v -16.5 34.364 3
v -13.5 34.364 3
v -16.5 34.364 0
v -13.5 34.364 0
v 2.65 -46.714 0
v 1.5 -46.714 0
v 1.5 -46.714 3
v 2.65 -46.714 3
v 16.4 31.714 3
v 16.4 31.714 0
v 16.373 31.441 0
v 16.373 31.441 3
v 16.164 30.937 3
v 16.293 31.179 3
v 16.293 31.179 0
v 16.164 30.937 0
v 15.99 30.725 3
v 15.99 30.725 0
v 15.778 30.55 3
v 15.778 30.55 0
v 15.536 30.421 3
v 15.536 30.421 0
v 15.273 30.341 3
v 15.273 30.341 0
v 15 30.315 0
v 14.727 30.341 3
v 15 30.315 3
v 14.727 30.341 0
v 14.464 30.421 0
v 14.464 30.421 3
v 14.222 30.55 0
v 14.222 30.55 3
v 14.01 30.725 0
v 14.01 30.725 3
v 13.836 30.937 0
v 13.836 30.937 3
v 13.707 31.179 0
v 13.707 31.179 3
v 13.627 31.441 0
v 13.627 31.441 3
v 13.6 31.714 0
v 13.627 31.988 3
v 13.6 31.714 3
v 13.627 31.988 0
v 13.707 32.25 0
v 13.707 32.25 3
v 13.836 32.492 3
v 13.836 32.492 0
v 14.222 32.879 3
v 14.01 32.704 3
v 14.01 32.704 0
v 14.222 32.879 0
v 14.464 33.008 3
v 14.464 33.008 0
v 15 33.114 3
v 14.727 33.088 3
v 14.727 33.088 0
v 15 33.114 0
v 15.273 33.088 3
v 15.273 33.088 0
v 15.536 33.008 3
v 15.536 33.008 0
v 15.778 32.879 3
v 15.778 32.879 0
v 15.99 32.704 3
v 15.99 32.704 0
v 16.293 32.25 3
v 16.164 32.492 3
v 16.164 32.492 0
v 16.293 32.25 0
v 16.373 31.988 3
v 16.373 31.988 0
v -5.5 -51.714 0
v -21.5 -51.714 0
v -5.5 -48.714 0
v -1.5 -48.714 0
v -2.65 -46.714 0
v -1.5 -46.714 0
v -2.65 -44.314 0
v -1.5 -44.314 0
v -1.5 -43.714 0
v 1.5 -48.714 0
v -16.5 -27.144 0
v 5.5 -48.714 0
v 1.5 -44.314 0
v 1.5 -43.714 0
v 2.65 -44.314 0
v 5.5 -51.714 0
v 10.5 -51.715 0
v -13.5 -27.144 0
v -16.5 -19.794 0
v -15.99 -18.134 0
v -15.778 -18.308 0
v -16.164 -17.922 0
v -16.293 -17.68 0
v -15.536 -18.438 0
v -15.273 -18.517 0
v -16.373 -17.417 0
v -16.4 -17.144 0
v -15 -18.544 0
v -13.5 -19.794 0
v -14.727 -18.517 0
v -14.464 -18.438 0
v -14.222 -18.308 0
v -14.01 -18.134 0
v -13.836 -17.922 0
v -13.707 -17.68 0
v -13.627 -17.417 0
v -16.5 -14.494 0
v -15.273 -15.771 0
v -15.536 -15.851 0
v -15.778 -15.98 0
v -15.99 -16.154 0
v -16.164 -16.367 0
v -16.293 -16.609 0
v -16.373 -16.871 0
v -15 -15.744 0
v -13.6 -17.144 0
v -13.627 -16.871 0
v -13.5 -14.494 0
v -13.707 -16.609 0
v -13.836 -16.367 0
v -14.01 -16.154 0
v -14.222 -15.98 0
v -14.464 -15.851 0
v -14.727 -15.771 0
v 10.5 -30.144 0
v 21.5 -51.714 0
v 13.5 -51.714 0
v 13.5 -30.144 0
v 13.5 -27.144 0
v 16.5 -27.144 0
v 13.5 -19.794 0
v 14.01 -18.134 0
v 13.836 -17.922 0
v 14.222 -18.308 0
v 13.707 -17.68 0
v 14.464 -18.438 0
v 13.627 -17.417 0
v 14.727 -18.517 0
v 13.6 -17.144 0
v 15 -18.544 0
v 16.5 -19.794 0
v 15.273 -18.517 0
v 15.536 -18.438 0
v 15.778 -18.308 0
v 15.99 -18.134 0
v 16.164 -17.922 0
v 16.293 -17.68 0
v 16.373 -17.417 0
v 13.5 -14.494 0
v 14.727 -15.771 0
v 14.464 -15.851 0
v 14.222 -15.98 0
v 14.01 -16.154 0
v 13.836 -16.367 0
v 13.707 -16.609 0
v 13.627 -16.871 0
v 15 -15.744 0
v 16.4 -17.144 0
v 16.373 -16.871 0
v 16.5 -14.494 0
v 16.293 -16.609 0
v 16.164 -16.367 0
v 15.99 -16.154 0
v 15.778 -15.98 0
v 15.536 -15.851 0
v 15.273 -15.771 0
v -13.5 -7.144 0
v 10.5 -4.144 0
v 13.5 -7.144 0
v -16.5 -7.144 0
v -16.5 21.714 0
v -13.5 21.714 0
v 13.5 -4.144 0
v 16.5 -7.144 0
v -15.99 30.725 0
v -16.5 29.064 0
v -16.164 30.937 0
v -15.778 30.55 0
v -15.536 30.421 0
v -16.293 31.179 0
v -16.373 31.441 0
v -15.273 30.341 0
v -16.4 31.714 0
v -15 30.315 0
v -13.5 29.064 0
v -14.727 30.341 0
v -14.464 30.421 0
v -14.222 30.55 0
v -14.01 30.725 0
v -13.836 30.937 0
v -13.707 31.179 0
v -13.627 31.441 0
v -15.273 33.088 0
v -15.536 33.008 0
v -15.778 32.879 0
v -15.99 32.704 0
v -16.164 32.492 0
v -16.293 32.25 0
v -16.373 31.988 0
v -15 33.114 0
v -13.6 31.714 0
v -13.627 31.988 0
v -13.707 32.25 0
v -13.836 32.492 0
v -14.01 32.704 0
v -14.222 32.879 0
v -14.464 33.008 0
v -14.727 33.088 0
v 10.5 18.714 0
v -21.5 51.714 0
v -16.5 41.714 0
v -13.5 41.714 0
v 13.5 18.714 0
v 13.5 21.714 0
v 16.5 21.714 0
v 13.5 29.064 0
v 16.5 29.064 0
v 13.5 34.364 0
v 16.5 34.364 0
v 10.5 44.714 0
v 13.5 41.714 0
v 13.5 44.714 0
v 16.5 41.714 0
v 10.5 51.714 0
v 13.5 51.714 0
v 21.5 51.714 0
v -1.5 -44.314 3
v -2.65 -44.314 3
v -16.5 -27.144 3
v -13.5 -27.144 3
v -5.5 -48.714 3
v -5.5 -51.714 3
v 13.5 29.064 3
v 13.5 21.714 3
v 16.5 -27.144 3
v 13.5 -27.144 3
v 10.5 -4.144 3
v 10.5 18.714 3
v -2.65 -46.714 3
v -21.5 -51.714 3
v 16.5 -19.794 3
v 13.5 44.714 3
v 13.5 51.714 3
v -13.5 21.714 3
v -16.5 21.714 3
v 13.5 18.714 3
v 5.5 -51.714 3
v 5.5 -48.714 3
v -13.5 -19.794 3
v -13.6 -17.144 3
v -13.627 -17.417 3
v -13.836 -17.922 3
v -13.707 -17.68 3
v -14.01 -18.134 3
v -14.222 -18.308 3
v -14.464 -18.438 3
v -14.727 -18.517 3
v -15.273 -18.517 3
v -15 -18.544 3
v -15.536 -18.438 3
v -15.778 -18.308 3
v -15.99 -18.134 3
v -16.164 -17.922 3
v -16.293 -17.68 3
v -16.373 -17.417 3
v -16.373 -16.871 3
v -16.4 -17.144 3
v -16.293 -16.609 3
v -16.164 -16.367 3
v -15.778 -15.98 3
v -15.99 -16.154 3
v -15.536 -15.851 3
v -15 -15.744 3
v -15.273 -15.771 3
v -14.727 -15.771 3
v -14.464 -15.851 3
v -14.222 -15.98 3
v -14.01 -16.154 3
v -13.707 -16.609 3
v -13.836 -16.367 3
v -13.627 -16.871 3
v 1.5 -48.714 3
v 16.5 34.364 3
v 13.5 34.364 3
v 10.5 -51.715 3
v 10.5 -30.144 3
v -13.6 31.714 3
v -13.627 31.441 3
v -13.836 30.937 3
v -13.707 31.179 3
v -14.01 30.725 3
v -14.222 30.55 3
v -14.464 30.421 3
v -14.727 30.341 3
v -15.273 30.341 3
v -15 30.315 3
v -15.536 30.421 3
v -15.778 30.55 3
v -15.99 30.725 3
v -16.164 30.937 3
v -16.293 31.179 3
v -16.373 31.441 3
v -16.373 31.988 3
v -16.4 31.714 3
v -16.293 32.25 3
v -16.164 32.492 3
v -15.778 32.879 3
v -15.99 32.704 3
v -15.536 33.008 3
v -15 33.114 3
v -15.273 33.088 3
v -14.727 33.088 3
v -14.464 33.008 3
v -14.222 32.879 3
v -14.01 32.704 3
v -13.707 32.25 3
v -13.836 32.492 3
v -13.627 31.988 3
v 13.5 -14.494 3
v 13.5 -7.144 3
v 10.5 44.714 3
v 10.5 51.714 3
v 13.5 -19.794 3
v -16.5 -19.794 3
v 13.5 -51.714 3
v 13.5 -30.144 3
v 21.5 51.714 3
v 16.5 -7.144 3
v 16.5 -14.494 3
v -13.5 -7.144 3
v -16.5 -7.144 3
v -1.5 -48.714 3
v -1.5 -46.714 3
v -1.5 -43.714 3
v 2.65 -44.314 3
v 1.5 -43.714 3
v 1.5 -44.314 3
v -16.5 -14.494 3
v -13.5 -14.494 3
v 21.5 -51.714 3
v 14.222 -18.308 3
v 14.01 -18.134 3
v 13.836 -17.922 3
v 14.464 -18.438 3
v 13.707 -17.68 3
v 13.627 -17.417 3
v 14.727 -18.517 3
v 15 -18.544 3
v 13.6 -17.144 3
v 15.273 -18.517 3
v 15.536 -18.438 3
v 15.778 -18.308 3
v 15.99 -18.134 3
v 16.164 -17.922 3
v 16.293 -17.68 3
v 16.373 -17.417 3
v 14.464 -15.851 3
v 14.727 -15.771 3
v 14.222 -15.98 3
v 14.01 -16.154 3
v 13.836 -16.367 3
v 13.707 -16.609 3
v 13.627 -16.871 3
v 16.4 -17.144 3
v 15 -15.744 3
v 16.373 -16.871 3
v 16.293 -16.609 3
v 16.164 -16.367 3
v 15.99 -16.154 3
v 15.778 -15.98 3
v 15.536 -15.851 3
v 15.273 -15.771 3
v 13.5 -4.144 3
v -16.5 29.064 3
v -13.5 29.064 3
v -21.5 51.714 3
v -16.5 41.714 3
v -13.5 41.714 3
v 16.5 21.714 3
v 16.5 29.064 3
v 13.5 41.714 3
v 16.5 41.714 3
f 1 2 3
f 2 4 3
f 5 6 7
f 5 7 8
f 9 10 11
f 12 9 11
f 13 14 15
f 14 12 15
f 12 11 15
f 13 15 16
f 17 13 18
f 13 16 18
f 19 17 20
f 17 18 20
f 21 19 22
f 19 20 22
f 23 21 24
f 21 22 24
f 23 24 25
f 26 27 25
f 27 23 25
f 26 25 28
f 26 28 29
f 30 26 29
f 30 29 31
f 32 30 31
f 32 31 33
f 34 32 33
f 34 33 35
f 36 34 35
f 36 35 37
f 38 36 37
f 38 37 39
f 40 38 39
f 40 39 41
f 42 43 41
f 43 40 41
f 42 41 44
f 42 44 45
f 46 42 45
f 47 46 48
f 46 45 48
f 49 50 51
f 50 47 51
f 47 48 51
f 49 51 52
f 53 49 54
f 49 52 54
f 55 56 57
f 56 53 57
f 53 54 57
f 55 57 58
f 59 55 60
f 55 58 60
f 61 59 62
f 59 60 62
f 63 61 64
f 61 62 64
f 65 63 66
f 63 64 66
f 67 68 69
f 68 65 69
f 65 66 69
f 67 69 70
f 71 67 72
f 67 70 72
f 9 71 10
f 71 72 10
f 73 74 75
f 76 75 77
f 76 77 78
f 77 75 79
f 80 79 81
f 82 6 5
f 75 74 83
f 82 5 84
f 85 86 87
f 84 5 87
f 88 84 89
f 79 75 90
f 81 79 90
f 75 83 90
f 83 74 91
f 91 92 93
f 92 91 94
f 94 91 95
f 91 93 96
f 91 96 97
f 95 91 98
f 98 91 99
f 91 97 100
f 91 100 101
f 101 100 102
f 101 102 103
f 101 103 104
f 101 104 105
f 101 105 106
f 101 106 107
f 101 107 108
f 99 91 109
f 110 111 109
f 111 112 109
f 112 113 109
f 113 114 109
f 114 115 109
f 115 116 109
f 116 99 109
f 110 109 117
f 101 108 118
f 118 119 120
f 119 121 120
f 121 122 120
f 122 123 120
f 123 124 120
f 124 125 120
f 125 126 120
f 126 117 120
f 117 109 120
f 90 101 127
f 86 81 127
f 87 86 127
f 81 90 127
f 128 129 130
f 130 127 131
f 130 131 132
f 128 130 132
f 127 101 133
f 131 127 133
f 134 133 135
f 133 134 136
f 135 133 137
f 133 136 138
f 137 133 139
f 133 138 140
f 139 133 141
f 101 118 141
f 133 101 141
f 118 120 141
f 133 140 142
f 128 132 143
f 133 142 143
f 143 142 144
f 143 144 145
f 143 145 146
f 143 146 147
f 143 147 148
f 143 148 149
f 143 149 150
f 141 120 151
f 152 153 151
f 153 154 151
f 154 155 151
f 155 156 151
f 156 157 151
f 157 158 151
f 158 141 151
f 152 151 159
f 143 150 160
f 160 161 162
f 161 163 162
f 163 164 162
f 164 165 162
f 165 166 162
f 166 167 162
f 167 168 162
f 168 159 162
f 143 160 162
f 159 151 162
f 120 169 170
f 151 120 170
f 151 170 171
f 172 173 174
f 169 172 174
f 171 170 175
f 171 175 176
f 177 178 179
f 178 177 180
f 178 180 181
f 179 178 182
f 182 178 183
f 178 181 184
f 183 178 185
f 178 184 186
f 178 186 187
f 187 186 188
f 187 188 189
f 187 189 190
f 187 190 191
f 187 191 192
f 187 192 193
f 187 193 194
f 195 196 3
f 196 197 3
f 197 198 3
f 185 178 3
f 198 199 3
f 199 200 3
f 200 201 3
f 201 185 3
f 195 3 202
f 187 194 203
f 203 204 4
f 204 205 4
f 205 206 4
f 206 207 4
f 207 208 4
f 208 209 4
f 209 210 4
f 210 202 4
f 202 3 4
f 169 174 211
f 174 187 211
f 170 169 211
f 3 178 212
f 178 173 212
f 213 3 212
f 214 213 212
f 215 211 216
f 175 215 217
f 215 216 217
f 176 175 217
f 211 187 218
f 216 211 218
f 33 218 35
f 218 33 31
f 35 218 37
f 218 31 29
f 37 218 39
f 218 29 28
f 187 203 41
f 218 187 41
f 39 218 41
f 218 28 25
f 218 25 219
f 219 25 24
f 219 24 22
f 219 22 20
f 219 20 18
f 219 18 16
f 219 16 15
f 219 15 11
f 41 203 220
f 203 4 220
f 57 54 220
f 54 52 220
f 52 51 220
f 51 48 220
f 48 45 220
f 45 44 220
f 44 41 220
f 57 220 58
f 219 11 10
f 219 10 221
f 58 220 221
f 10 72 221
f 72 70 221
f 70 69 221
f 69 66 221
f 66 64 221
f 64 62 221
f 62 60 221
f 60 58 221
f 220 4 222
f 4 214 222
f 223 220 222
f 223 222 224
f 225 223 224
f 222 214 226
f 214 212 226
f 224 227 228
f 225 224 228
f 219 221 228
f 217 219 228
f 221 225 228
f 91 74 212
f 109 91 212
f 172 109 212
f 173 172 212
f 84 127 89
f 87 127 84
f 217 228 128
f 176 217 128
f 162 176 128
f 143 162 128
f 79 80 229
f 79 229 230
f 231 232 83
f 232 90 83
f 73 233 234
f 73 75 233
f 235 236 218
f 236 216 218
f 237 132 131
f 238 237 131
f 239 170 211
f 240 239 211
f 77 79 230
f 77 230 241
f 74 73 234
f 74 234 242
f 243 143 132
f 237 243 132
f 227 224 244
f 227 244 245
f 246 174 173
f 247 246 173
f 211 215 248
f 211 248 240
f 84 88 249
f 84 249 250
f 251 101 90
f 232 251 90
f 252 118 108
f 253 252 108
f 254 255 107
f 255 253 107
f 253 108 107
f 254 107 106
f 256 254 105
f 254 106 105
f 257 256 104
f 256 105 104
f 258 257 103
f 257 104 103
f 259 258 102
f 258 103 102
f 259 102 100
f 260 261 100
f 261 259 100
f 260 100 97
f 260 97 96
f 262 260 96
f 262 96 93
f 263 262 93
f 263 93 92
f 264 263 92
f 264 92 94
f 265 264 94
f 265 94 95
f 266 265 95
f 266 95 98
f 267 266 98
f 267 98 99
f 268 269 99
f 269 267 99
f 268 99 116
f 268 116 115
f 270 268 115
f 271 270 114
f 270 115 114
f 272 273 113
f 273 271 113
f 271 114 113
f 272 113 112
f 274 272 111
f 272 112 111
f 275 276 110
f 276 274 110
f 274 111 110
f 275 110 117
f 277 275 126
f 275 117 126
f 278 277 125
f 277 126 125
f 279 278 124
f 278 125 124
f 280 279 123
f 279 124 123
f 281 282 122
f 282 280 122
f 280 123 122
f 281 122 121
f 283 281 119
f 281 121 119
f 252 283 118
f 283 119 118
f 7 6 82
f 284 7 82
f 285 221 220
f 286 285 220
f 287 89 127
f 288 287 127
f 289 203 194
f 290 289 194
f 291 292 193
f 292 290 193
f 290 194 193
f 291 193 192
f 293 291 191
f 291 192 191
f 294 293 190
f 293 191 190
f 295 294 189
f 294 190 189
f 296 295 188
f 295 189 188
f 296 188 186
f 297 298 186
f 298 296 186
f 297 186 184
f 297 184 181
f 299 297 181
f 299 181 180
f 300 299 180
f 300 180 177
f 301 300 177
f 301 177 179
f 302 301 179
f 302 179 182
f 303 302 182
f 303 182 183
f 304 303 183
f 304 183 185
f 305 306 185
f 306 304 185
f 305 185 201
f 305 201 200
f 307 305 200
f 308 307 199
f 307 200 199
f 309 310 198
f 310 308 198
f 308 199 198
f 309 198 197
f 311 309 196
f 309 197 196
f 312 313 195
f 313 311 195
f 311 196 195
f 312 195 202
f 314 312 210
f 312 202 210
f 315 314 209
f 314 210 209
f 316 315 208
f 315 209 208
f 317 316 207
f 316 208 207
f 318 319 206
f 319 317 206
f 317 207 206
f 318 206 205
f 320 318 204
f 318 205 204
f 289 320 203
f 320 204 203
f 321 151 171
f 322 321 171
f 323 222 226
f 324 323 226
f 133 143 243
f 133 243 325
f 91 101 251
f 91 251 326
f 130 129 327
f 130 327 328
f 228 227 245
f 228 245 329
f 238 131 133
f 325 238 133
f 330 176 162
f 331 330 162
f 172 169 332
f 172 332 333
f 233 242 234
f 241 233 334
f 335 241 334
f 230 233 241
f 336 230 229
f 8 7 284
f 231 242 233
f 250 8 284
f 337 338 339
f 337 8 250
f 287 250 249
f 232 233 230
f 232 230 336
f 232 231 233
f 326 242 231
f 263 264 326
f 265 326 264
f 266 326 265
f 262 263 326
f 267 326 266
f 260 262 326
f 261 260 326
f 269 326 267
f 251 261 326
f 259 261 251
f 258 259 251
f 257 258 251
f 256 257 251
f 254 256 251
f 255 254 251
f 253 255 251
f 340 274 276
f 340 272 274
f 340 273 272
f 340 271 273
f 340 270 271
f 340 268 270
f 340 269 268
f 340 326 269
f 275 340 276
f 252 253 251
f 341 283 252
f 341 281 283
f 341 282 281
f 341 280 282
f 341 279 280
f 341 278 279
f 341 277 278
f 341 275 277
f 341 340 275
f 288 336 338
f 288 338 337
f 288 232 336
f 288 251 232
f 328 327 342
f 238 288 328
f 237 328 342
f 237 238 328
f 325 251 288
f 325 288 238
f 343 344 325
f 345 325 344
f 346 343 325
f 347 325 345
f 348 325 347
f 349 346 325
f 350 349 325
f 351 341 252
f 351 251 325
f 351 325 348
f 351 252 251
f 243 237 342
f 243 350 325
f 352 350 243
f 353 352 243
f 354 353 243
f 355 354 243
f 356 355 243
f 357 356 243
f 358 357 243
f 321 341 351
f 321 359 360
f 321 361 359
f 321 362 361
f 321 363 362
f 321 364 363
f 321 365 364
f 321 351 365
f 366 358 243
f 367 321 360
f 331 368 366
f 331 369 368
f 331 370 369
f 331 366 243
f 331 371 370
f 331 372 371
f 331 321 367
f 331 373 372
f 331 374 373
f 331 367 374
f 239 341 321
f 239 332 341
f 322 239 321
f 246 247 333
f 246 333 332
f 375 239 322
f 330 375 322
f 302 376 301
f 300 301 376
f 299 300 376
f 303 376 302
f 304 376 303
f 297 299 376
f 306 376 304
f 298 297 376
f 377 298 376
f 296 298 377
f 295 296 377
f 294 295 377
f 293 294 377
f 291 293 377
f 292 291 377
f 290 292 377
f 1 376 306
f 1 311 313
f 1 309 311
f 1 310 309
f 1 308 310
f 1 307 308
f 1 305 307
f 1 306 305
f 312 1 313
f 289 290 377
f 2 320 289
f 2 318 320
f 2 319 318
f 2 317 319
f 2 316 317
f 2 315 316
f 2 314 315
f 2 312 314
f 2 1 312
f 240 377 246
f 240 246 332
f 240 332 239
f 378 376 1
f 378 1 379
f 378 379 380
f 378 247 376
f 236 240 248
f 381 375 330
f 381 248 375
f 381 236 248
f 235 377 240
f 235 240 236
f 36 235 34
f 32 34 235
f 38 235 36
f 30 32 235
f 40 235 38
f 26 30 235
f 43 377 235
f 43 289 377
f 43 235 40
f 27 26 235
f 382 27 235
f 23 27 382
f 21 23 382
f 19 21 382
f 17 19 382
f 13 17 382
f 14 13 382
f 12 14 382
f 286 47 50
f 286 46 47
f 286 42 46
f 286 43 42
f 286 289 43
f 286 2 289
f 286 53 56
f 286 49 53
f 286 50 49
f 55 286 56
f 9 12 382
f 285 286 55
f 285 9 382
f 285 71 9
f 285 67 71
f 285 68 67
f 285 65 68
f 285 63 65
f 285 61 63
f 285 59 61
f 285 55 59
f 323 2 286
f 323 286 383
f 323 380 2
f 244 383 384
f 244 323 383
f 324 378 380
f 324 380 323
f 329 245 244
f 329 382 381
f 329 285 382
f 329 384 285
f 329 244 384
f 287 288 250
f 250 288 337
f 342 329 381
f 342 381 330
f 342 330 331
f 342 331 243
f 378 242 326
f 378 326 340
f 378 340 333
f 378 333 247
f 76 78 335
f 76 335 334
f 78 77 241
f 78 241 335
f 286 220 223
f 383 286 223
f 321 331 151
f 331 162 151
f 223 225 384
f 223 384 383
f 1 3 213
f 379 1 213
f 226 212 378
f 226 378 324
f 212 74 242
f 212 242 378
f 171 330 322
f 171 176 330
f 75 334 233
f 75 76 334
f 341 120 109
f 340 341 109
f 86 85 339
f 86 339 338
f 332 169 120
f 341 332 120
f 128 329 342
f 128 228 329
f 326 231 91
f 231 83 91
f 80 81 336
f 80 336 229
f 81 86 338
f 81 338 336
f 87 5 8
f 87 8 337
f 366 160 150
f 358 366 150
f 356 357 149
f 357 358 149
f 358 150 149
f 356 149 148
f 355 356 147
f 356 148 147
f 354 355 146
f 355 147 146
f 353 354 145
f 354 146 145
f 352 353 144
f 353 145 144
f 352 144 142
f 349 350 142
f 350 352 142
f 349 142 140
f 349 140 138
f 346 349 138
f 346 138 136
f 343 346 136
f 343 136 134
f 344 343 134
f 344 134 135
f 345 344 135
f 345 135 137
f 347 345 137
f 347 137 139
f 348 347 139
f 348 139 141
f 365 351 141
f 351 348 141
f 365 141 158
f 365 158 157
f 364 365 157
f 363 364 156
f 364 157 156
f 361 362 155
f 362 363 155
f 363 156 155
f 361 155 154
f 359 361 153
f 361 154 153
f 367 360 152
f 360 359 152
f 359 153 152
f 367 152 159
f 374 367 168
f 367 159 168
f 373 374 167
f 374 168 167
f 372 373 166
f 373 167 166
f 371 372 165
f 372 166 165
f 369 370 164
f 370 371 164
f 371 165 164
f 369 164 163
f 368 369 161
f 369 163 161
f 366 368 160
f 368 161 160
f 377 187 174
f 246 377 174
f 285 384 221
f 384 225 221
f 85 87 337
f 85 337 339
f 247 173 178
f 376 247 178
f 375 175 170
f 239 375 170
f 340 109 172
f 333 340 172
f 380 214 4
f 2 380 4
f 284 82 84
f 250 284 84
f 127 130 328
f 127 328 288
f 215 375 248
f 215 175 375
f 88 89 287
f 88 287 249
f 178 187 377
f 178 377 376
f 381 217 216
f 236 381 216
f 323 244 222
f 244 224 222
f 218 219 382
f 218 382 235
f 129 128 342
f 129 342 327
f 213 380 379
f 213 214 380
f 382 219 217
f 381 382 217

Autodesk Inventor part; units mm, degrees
ref_plane "YZ Plane" through (0, 0, 0) normal (1, 0, 0) x (0, 1, 0)
ref_plane "XZ Plane" through (0, 0, 0) normal (0, 1, 0) x (-1, 0, 0)
ref_plane "XY Plane" through (0, 0, 0) normal (0, 0, 1) x (1, 0, 0)
sketch "Sketch1" plane through (0, 0, 0) normal (0, 0, 1) x (1, 0, 0)
  line L0 (-21.5, 51.7145) -> (21.5, 51.7145)
  line L1 (21.5, 51.7145) -> (21.5, -51.7145)
  line L2 (-21.5, -51.7145) -> (-21.5, 51.7145)
  line L3 (5.5, -51.7145) -> (5.5, -48.7145)
  line L4 (1.5, -46.7145) -> (2.65, -46.7145)
  line L5 (2.65, -46.7145) -> (2.65, -44.3145)
  line L6 (2.65, -44.3145) -> (1.5, -44.3145)
  line L7 (1.5, -44.3145) -> (1.5, -43.7145)
  line L8 (1.5, -43.7145) -> (-1.5, -43.7145)
  line L9 (-1.5, -43.7145) -> (-1.5, -44.3145)
  line L10 (-1.5, -44.3145) -> (-2.65, -44.3145)
  line L11 (-2.65, -44.3145) -> (-2.65, -46.7145)
  line L12 (-2.65, -46.7145) -> (-1.5, -46.7145)
  line L13 (-5.5, -48.7145) -> (-5.5, -51.7145)
  line L14 (1.5, -46.7145) -> (1.5, -48.7145)
  line L15 (1.5, -48.7145) -> (5.5, -48.7145)
  line L16 (-1.5, -46.7145) -> (-1.5, -48.7145)
  line L17 (-1.5, -48.7145) -> (-5.5, -48.7145)
  line L18 (21.5, -51.7145) -> (13.5, -51.7145)
  line L19 (-5.5, -51.7145) -> (-21.5, -51.7145)
  line L20 (-30.1, 0) -> (30.1, 0) construction
  line L21 (0, -72.4008) -> (0, 72.4004) construction
  line L22 (13.5, 44.7145) -> (13.5, 51.7145) projected
  line L23 (13.5, 51.7145) -> (10.5, 51.7145) projected
  line L24 (10.5, 44.7145) -> (10.5, 51.7145) projected
  line L25 (13.5, 44.7145) -> (10.5, 44.7145) projected
  line L26 (13.5, -4.1443) -> (13.5, 18.7145) projected
  line L27 (13.5, 18.7145) -> (10.5, 18.7145) projected
  line L28 (10.5, -4.1443) -> (10.5, 18.7145) projected
  line L29 (13.5, -4.1443) -> (10.5, -4.1443) projected
  line L30 (13.5, -51.7149) -> (13.5, -30.1443) projected
  line L31 (13.5, -30.1443) -> (10.5, -30.1443) projected
  line L32 (10.5, -51.7149) -> (10.5, -30.1443) projected
  line L33 (13.5, -51.7149) -> (10.5, -51.7149) projected
  line L34 (16.5, 41.7145) -> (16.5, 34.3645) projected
  line L35 (16.5, 41.7145) -> (13.5, 41.7145) projected
  line L36 (13.5, 34.3645) -> (13.5, 41.7145) projected
  line L37 (16.5, 34.3645) -> (13.5, 34.3645) projected
  line L38 (16.5, 29.0645) -> (16.5, 21.7145) projected
  line L39 (16.5, 29.0645) -> (13.5, 29.0645) projected
  line L40 (13.5, 21.7145) -> (13.5, 29.0645) projected
  line L41 (16.5, 21.7145) -> (13.5, 21.7145) projected
  line L42 (16.5, -7.1443) -> (16.5, -14.4943) projected
  line L43 (16.5, -7.1443) -> (13.5, -7.1443) projected
  line L44 (13.5, -14.4943) -> (13.5, -7.1443) projected
  line L45 (16.5, -14.4943) -> (13.5, -14.4943) projected
  line L46 (16.5, -19.7943) -> (16.5, -27.1443) projected
  line L47 (16.5, -19.7943) -> (13.5, -19.7943) projected
  line L48 (13.5, -27.1443) -> (13.5, -19.7943) projected
  line L49 (16.5, -27.1443) -> (13.5, -27.1443) projected
  line L50 (-13.5, -19.7943) -> (-13.5, -27.1443) projected
  line L51 (-13.5, -19.7943) -> (-16.5, -19.7943) projected
  line L52 (-16.5, -27.1443) -> (-16.5, -19.7943) projected
  line L53 (-13.5, -27.1443) -> (-16.5, -27.1443) projected
  line L54 (-13.5, -7.1443) -> (-13.5, -14.4943) projected
  line L55 (-13.5, -7.1443) -> (-16.5, -7.1443) projected
  line L56 (-16.5, -14.4943) -> (-16.5, -7.1443) projected
  line L57 (-13.5, -14.4943) -> (-16.5, -14.4943) projected
  line L58 (-13.5, 29.0645) -> (-13.5, 21.7145) projected
  line L59 (-13.5, 29.0645) -> (-16.5, 29.0645) projected
  line L60 (-16.5, 21.7145) -> (-16.5, 29.0645) projected
  line L61 (-13.5, 21.7145) -> (-16.5, 21.7145) projected
  line L62 (-13.5, 41.7145) -> (-13.5, 34.3645) projected
  line L63 (-13.5, 41.7145) -> (-16.5, 41.7145) projected
  line L64 (-16.5, 34.3645) -> (-16.5, 41.7145) projected
  line L65 (-13.5, 34.3645) -> (-16.5, 34.3645) projected
  line L66 (16.5, 34.3645) -> (13.5, 29.0645) construction
  line L67 (13.5, 34.3645) -> (16.5, 29.0645) construction
  line L68 (13.5, -14.4943) -> (16.5, -19.7943) construction
  line L69 (16.5, -14.4943) -> (13.5, -19.7943) construction
  line L70 (-13.5, -14.4943) -> (-16.5, -19.7943) construction
  line L71 (-16.5, -14.4943) -> (-13.5, -19.7943) construction
  line L72 (-13.5, 34.3645) -> (-16.5, 29.0645) construction
  line L73 (-16.5, 34.3645) -> (-13.5, 29.0645) construction
  circle A0 centre (-15, 31.7145) radius 1.4
  circle A1 centre (15, 31.7145) radius 1.4
  circle A2 centre (15, -17.1443) radius 1.4
  circle A3 centre (-15, -17.1443) radius 1.4
  line L74 (13.5, -51.7145) -> (10.5, -51.7145)
  line L75 (10.5, -51.7145) -> (5.5, -51.7145)
  dimension "d0" = 43
  dimension "d12" = 3
  dimension "d13" = 5.3
  dimension "d15" = 2.4
  dimension "d19" = 3
  dimension "d20" = 5
  dimension "d21" = 8
  dimension "d25" = 103.429
  dimension "d26" = 2.8
  dimension "d27" = 2.8
  dimension "d28" = 2.8
  dimension "d29" = 2.8
  dimension "d30" = 5
extrude "Extrusion1" add sketch "Sketch1" along normal blind 3 contours L0 L24 L25 L22 L1 L18 L30 L31 L32 L75 L3 L15 L14 L4 L5 L6 L7 L8 L9 L10 L11 L12 L16 L17 L13 L19 L2
properties part number "Y-Shafts-Holder_Side"
